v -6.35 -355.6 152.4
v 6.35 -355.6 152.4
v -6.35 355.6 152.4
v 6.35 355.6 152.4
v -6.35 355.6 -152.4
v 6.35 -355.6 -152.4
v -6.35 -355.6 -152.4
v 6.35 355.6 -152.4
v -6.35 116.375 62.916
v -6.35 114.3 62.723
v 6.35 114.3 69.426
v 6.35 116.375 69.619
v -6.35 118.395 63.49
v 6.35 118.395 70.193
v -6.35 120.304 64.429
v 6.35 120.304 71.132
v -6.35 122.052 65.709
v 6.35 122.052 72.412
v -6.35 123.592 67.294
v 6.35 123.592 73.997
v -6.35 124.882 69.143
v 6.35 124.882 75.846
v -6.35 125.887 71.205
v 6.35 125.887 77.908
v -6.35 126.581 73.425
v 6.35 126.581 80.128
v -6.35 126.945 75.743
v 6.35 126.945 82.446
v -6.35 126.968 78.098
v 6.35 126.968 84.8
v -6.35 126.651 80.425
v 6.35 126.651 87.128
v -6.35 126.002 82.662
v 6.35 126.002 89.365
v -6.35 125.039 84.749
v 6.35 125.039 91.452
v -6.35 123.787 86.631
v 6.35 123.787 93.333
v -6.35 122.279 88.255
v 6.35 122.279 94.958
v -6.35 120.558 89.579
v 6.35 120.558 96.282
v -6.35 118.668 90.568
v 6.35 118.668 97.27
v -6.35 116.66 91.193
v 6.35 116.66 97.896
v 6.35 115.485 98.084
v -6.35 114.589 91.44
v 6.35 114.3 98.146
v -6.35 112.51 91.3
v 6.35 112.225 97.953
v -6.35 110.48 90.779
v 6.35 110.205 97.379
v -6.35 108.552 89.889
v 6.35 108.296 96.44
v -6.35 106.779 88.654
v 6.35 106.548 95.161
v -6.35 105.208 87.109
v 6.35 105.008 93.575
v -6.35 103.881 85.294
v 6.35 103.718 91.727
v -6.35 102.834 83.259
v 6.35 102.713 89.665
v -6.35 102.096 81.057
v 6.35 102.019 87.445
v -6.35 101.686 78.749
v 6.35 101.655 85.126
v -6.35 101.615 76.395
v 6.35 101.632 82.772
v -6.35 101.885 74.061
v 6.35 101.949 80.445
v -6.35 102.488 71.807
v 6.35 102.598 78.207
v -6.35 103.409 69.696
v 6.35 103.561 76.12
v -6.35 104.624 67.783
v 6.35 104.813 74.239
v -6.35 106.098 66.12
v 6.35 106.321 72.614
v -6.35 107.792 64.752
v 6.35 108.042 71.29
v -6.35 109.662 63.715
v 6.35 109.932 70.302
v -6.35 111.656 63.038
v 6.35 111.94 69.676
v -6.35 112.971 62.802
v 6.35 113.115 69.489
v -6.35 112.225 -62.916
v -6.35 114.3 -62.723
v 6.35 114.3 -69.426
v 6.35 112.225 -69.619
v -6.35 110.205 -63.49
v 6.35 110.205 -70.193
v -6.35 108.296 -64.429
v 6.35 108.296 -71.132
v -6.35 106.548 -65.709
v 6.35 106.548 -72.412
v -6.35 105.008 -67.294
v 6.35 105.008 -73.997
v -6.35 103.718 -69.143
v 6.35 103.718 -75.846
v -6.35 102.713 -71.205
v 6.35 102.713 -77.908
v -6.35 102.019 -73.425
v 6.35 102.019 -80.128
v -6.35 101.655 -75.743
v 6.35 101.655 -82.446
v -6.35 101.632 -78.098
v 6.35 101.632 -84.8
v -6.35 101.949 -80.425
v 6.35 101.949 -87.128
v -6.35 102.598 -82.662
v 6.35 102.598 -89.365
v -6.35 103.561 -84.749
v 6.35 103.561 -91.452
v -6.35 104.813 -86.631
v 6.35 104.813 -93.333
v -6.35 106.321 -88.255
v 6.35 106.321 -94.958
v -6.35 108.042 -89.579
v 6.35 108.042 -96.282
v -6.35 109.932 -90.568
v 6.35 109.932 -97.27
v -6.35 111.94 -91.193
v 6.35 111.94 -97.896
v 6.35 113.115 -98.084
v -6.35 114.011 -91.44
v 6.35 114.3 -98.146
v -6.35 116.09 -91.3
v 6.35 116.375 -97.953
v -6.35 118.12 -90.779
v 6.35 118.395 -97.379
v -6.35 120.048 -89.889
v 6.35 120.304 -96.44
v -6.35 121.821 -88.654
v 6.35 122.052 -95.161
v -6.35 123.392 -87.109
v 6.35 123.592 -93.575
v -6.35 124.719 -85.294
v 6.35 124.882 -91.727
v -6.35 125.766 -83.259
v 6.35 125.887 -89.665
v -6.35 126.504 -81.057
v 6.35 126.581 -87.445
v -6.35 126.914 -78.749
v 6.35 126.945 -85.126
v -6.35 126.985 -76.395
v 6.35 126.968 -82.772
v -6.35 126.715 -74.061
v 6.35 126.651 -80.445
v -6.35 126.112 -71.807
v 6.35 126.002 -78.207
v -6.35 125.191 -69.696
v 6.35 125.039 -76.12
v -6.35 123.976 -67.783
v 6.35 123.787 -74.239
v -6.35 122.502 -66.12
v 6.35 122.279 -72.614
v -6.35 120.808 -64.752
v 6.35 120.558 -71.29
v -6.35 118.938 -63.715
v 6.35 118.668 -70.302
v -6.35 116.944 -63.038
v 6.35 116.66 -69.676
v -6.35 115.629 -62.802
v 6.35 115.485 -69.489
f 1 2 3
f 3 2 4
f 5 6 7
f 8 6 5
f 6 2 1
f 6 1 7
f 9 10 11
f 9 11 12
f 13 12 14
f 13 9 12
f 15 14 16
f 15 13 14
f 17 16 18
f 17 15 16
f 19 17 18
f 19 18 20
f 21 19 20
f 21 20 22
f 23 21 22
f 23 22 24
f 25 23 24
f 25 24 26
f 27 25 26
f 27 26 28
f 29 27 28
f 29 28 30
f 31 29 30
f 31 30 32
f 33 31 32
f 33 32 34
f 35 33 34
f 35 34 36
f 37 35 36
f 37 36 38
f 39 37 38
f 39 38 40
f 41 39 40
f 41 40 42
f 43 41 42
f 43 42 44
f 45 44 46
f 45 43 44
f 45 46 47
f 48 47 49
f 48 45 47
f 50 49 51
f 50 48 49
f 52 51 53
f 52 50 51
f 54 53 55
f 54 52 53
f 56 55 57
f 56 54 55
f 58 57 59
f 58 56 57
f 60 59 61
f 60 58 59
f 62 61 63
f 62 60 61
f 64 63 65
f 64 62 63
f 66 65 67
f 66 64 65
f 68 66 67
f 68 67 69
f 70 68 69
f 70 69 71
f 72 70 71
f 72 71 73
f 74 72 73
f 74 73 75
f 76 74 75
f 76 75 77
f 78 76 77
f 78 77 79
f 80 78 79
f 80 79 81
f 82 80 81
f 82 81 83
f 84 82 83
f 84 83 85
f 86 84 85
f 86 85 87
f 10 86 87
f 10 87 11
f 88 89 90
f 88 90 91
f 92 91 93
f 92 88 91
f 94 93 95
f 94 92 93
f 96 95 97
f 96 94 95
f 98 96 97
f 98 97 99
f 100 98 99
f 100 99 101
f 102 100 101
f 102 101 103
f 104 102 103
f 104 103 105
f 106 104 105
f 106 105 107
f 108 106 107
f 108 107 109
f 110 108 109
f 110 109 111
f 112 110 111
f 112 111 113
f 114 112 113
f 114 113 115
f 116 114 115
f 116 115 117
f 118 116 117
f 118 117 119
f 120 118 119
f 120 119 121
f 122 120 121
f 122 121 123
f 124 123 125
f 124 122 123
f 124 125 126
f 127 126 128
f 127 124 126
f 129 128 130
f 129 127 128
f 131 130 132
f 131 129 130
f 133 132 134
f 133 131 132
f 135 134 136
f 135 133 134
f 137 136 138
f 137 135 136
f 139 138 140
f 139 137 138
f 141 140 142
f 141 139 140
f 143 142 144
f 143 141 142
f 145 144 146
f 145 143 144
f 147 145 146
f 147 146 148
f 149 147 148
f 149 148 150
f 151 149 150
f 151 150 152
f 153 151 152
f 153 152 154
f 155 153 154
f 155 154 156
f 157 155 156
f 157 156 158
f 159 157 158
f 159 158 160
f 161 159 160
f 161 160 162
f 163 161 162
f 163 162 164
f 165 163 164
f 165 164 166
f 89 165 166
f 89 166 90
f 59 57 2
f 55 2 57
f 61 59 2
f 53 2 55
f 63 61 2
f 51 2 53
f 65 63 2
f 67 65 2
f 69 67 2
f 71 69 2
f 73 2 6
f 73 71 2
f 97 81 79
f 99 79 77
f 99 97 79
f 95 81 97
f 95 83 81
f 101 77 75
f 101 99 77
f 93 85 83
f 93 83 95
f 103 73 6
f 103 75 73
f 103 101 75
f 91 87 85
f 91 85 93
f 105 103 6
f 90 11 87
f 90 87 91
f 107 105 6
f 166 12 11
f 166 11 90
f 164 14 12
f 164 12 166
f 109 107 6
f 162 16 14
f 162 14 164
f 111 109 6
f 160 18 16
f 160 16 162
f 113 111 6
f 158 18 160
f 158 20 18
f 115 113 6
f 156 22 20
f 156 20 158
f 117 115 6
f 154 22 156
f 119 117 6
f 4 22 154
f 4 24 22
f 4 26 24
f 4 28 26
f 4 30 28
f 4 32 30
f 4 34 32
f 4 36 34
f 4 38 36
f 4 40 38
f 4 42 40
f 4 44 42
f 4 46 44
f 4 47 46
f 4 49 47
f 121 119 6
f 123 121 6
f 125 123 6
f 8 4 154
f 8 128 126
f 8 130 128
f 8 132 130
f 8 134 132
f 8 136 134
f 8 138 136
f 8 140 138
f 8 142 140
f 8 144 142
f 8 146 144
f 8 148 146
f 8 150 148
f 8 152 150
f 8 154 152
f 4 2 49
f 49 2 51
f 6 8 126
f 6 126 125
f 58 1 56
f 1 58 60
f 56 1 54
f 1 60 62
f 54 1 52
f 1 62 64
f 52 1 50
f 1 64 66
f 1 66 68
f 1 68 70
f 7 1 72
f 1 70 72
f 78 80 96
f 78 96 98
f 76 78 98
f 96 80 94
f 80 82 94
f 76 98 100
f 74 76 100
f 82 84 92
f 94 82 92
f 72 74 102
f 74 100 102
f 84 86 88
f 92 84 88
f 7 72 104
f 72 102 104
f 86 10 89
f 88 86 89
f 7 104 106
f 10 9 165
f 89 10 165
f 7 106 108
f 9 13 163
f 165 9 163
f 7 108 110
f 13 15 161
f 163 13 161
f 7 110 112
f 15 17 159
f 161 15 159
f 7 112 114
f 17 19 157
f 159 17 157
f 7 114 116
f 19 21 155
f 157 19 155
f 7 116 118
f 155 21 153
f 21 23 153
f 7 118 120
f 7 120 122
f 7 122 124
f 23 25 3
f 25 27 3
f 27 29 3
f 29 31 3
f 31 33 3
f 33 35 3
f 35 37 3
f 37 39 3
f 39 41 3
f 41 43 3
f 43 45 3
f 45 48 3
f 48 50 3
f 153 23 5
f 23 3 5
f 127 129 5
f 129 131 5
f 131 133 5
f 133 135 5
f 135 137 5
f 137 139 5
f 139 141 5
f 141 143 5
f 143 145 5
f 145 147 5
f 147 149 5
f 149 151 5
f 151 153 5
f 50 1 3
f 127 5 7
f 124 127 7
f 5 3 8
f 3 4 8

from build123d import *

# Parameters (mm, degrees)
SKETCH1_W           = 304.8
SKETCH1_H           = 711.2
BOSS_EXTRUDE1_DEPTH = 6.35
CAVITY1_START       = 23.660689199
CAVITY1_OUTLINE_R   = 12.7
CAVITY1_DEPTH       = 27.76582142
CAVITY1_2_OUTLINE_R = 12.7
CAVITY1_2_DEPTH     = 27.76582142


# Read off the part's stored shape, not the designer's step: Cavity1
with BuildPart() as part:
    # Sketch1 → Boss-Extrude1 (new, symmetric)
    with BuildSketch(Plane(origin=(0, 0, 0), x_dir=(0, 0, -1), z_dir=(1, 0, 0))):
        Rectangle(SKETCH1_W, SKETCH1_H)
    extrude(amount=BOSS_EXTRUDE1_DEPTH, both=True)

    # Cavity1 outline → Cavity1 (cut)
    with BuildSketch(Plane(origin=(0, 0, 0), x_dir=(0.4667586195581355, 0, 0.8843847528469629), z_dir=(0.8843847528469628, 0, -0.4667586195581359)).offset(CAVITY1_START)):
        with Locations((-71.135241933, -114.3)):
            Circle(CAVITY1_OUTLINE_R)
    extrude(amount=CAVITY1_DEPTH, mode=Mode.SUBTRACT)

    # Cavity1 2 outline → Cavity1 2 (cut)
    with BuildSketch(Plane(origin=(0, 0, 0), x_dir=(0.4667586195581373, 0, -0.8843847528469619), z_dir=(0.8843847528469618, 0, 0.4667586195581379)).offset(CAVITY1_START)):
        with Locations((-71.135241933, 114.3)):
            Circle(CAVITY1_2_OUTLINE_R)
    extrude(amount=CAVITY1_2_DEPTH, mode=Mode.SUBTRACT)


solid = part.part
